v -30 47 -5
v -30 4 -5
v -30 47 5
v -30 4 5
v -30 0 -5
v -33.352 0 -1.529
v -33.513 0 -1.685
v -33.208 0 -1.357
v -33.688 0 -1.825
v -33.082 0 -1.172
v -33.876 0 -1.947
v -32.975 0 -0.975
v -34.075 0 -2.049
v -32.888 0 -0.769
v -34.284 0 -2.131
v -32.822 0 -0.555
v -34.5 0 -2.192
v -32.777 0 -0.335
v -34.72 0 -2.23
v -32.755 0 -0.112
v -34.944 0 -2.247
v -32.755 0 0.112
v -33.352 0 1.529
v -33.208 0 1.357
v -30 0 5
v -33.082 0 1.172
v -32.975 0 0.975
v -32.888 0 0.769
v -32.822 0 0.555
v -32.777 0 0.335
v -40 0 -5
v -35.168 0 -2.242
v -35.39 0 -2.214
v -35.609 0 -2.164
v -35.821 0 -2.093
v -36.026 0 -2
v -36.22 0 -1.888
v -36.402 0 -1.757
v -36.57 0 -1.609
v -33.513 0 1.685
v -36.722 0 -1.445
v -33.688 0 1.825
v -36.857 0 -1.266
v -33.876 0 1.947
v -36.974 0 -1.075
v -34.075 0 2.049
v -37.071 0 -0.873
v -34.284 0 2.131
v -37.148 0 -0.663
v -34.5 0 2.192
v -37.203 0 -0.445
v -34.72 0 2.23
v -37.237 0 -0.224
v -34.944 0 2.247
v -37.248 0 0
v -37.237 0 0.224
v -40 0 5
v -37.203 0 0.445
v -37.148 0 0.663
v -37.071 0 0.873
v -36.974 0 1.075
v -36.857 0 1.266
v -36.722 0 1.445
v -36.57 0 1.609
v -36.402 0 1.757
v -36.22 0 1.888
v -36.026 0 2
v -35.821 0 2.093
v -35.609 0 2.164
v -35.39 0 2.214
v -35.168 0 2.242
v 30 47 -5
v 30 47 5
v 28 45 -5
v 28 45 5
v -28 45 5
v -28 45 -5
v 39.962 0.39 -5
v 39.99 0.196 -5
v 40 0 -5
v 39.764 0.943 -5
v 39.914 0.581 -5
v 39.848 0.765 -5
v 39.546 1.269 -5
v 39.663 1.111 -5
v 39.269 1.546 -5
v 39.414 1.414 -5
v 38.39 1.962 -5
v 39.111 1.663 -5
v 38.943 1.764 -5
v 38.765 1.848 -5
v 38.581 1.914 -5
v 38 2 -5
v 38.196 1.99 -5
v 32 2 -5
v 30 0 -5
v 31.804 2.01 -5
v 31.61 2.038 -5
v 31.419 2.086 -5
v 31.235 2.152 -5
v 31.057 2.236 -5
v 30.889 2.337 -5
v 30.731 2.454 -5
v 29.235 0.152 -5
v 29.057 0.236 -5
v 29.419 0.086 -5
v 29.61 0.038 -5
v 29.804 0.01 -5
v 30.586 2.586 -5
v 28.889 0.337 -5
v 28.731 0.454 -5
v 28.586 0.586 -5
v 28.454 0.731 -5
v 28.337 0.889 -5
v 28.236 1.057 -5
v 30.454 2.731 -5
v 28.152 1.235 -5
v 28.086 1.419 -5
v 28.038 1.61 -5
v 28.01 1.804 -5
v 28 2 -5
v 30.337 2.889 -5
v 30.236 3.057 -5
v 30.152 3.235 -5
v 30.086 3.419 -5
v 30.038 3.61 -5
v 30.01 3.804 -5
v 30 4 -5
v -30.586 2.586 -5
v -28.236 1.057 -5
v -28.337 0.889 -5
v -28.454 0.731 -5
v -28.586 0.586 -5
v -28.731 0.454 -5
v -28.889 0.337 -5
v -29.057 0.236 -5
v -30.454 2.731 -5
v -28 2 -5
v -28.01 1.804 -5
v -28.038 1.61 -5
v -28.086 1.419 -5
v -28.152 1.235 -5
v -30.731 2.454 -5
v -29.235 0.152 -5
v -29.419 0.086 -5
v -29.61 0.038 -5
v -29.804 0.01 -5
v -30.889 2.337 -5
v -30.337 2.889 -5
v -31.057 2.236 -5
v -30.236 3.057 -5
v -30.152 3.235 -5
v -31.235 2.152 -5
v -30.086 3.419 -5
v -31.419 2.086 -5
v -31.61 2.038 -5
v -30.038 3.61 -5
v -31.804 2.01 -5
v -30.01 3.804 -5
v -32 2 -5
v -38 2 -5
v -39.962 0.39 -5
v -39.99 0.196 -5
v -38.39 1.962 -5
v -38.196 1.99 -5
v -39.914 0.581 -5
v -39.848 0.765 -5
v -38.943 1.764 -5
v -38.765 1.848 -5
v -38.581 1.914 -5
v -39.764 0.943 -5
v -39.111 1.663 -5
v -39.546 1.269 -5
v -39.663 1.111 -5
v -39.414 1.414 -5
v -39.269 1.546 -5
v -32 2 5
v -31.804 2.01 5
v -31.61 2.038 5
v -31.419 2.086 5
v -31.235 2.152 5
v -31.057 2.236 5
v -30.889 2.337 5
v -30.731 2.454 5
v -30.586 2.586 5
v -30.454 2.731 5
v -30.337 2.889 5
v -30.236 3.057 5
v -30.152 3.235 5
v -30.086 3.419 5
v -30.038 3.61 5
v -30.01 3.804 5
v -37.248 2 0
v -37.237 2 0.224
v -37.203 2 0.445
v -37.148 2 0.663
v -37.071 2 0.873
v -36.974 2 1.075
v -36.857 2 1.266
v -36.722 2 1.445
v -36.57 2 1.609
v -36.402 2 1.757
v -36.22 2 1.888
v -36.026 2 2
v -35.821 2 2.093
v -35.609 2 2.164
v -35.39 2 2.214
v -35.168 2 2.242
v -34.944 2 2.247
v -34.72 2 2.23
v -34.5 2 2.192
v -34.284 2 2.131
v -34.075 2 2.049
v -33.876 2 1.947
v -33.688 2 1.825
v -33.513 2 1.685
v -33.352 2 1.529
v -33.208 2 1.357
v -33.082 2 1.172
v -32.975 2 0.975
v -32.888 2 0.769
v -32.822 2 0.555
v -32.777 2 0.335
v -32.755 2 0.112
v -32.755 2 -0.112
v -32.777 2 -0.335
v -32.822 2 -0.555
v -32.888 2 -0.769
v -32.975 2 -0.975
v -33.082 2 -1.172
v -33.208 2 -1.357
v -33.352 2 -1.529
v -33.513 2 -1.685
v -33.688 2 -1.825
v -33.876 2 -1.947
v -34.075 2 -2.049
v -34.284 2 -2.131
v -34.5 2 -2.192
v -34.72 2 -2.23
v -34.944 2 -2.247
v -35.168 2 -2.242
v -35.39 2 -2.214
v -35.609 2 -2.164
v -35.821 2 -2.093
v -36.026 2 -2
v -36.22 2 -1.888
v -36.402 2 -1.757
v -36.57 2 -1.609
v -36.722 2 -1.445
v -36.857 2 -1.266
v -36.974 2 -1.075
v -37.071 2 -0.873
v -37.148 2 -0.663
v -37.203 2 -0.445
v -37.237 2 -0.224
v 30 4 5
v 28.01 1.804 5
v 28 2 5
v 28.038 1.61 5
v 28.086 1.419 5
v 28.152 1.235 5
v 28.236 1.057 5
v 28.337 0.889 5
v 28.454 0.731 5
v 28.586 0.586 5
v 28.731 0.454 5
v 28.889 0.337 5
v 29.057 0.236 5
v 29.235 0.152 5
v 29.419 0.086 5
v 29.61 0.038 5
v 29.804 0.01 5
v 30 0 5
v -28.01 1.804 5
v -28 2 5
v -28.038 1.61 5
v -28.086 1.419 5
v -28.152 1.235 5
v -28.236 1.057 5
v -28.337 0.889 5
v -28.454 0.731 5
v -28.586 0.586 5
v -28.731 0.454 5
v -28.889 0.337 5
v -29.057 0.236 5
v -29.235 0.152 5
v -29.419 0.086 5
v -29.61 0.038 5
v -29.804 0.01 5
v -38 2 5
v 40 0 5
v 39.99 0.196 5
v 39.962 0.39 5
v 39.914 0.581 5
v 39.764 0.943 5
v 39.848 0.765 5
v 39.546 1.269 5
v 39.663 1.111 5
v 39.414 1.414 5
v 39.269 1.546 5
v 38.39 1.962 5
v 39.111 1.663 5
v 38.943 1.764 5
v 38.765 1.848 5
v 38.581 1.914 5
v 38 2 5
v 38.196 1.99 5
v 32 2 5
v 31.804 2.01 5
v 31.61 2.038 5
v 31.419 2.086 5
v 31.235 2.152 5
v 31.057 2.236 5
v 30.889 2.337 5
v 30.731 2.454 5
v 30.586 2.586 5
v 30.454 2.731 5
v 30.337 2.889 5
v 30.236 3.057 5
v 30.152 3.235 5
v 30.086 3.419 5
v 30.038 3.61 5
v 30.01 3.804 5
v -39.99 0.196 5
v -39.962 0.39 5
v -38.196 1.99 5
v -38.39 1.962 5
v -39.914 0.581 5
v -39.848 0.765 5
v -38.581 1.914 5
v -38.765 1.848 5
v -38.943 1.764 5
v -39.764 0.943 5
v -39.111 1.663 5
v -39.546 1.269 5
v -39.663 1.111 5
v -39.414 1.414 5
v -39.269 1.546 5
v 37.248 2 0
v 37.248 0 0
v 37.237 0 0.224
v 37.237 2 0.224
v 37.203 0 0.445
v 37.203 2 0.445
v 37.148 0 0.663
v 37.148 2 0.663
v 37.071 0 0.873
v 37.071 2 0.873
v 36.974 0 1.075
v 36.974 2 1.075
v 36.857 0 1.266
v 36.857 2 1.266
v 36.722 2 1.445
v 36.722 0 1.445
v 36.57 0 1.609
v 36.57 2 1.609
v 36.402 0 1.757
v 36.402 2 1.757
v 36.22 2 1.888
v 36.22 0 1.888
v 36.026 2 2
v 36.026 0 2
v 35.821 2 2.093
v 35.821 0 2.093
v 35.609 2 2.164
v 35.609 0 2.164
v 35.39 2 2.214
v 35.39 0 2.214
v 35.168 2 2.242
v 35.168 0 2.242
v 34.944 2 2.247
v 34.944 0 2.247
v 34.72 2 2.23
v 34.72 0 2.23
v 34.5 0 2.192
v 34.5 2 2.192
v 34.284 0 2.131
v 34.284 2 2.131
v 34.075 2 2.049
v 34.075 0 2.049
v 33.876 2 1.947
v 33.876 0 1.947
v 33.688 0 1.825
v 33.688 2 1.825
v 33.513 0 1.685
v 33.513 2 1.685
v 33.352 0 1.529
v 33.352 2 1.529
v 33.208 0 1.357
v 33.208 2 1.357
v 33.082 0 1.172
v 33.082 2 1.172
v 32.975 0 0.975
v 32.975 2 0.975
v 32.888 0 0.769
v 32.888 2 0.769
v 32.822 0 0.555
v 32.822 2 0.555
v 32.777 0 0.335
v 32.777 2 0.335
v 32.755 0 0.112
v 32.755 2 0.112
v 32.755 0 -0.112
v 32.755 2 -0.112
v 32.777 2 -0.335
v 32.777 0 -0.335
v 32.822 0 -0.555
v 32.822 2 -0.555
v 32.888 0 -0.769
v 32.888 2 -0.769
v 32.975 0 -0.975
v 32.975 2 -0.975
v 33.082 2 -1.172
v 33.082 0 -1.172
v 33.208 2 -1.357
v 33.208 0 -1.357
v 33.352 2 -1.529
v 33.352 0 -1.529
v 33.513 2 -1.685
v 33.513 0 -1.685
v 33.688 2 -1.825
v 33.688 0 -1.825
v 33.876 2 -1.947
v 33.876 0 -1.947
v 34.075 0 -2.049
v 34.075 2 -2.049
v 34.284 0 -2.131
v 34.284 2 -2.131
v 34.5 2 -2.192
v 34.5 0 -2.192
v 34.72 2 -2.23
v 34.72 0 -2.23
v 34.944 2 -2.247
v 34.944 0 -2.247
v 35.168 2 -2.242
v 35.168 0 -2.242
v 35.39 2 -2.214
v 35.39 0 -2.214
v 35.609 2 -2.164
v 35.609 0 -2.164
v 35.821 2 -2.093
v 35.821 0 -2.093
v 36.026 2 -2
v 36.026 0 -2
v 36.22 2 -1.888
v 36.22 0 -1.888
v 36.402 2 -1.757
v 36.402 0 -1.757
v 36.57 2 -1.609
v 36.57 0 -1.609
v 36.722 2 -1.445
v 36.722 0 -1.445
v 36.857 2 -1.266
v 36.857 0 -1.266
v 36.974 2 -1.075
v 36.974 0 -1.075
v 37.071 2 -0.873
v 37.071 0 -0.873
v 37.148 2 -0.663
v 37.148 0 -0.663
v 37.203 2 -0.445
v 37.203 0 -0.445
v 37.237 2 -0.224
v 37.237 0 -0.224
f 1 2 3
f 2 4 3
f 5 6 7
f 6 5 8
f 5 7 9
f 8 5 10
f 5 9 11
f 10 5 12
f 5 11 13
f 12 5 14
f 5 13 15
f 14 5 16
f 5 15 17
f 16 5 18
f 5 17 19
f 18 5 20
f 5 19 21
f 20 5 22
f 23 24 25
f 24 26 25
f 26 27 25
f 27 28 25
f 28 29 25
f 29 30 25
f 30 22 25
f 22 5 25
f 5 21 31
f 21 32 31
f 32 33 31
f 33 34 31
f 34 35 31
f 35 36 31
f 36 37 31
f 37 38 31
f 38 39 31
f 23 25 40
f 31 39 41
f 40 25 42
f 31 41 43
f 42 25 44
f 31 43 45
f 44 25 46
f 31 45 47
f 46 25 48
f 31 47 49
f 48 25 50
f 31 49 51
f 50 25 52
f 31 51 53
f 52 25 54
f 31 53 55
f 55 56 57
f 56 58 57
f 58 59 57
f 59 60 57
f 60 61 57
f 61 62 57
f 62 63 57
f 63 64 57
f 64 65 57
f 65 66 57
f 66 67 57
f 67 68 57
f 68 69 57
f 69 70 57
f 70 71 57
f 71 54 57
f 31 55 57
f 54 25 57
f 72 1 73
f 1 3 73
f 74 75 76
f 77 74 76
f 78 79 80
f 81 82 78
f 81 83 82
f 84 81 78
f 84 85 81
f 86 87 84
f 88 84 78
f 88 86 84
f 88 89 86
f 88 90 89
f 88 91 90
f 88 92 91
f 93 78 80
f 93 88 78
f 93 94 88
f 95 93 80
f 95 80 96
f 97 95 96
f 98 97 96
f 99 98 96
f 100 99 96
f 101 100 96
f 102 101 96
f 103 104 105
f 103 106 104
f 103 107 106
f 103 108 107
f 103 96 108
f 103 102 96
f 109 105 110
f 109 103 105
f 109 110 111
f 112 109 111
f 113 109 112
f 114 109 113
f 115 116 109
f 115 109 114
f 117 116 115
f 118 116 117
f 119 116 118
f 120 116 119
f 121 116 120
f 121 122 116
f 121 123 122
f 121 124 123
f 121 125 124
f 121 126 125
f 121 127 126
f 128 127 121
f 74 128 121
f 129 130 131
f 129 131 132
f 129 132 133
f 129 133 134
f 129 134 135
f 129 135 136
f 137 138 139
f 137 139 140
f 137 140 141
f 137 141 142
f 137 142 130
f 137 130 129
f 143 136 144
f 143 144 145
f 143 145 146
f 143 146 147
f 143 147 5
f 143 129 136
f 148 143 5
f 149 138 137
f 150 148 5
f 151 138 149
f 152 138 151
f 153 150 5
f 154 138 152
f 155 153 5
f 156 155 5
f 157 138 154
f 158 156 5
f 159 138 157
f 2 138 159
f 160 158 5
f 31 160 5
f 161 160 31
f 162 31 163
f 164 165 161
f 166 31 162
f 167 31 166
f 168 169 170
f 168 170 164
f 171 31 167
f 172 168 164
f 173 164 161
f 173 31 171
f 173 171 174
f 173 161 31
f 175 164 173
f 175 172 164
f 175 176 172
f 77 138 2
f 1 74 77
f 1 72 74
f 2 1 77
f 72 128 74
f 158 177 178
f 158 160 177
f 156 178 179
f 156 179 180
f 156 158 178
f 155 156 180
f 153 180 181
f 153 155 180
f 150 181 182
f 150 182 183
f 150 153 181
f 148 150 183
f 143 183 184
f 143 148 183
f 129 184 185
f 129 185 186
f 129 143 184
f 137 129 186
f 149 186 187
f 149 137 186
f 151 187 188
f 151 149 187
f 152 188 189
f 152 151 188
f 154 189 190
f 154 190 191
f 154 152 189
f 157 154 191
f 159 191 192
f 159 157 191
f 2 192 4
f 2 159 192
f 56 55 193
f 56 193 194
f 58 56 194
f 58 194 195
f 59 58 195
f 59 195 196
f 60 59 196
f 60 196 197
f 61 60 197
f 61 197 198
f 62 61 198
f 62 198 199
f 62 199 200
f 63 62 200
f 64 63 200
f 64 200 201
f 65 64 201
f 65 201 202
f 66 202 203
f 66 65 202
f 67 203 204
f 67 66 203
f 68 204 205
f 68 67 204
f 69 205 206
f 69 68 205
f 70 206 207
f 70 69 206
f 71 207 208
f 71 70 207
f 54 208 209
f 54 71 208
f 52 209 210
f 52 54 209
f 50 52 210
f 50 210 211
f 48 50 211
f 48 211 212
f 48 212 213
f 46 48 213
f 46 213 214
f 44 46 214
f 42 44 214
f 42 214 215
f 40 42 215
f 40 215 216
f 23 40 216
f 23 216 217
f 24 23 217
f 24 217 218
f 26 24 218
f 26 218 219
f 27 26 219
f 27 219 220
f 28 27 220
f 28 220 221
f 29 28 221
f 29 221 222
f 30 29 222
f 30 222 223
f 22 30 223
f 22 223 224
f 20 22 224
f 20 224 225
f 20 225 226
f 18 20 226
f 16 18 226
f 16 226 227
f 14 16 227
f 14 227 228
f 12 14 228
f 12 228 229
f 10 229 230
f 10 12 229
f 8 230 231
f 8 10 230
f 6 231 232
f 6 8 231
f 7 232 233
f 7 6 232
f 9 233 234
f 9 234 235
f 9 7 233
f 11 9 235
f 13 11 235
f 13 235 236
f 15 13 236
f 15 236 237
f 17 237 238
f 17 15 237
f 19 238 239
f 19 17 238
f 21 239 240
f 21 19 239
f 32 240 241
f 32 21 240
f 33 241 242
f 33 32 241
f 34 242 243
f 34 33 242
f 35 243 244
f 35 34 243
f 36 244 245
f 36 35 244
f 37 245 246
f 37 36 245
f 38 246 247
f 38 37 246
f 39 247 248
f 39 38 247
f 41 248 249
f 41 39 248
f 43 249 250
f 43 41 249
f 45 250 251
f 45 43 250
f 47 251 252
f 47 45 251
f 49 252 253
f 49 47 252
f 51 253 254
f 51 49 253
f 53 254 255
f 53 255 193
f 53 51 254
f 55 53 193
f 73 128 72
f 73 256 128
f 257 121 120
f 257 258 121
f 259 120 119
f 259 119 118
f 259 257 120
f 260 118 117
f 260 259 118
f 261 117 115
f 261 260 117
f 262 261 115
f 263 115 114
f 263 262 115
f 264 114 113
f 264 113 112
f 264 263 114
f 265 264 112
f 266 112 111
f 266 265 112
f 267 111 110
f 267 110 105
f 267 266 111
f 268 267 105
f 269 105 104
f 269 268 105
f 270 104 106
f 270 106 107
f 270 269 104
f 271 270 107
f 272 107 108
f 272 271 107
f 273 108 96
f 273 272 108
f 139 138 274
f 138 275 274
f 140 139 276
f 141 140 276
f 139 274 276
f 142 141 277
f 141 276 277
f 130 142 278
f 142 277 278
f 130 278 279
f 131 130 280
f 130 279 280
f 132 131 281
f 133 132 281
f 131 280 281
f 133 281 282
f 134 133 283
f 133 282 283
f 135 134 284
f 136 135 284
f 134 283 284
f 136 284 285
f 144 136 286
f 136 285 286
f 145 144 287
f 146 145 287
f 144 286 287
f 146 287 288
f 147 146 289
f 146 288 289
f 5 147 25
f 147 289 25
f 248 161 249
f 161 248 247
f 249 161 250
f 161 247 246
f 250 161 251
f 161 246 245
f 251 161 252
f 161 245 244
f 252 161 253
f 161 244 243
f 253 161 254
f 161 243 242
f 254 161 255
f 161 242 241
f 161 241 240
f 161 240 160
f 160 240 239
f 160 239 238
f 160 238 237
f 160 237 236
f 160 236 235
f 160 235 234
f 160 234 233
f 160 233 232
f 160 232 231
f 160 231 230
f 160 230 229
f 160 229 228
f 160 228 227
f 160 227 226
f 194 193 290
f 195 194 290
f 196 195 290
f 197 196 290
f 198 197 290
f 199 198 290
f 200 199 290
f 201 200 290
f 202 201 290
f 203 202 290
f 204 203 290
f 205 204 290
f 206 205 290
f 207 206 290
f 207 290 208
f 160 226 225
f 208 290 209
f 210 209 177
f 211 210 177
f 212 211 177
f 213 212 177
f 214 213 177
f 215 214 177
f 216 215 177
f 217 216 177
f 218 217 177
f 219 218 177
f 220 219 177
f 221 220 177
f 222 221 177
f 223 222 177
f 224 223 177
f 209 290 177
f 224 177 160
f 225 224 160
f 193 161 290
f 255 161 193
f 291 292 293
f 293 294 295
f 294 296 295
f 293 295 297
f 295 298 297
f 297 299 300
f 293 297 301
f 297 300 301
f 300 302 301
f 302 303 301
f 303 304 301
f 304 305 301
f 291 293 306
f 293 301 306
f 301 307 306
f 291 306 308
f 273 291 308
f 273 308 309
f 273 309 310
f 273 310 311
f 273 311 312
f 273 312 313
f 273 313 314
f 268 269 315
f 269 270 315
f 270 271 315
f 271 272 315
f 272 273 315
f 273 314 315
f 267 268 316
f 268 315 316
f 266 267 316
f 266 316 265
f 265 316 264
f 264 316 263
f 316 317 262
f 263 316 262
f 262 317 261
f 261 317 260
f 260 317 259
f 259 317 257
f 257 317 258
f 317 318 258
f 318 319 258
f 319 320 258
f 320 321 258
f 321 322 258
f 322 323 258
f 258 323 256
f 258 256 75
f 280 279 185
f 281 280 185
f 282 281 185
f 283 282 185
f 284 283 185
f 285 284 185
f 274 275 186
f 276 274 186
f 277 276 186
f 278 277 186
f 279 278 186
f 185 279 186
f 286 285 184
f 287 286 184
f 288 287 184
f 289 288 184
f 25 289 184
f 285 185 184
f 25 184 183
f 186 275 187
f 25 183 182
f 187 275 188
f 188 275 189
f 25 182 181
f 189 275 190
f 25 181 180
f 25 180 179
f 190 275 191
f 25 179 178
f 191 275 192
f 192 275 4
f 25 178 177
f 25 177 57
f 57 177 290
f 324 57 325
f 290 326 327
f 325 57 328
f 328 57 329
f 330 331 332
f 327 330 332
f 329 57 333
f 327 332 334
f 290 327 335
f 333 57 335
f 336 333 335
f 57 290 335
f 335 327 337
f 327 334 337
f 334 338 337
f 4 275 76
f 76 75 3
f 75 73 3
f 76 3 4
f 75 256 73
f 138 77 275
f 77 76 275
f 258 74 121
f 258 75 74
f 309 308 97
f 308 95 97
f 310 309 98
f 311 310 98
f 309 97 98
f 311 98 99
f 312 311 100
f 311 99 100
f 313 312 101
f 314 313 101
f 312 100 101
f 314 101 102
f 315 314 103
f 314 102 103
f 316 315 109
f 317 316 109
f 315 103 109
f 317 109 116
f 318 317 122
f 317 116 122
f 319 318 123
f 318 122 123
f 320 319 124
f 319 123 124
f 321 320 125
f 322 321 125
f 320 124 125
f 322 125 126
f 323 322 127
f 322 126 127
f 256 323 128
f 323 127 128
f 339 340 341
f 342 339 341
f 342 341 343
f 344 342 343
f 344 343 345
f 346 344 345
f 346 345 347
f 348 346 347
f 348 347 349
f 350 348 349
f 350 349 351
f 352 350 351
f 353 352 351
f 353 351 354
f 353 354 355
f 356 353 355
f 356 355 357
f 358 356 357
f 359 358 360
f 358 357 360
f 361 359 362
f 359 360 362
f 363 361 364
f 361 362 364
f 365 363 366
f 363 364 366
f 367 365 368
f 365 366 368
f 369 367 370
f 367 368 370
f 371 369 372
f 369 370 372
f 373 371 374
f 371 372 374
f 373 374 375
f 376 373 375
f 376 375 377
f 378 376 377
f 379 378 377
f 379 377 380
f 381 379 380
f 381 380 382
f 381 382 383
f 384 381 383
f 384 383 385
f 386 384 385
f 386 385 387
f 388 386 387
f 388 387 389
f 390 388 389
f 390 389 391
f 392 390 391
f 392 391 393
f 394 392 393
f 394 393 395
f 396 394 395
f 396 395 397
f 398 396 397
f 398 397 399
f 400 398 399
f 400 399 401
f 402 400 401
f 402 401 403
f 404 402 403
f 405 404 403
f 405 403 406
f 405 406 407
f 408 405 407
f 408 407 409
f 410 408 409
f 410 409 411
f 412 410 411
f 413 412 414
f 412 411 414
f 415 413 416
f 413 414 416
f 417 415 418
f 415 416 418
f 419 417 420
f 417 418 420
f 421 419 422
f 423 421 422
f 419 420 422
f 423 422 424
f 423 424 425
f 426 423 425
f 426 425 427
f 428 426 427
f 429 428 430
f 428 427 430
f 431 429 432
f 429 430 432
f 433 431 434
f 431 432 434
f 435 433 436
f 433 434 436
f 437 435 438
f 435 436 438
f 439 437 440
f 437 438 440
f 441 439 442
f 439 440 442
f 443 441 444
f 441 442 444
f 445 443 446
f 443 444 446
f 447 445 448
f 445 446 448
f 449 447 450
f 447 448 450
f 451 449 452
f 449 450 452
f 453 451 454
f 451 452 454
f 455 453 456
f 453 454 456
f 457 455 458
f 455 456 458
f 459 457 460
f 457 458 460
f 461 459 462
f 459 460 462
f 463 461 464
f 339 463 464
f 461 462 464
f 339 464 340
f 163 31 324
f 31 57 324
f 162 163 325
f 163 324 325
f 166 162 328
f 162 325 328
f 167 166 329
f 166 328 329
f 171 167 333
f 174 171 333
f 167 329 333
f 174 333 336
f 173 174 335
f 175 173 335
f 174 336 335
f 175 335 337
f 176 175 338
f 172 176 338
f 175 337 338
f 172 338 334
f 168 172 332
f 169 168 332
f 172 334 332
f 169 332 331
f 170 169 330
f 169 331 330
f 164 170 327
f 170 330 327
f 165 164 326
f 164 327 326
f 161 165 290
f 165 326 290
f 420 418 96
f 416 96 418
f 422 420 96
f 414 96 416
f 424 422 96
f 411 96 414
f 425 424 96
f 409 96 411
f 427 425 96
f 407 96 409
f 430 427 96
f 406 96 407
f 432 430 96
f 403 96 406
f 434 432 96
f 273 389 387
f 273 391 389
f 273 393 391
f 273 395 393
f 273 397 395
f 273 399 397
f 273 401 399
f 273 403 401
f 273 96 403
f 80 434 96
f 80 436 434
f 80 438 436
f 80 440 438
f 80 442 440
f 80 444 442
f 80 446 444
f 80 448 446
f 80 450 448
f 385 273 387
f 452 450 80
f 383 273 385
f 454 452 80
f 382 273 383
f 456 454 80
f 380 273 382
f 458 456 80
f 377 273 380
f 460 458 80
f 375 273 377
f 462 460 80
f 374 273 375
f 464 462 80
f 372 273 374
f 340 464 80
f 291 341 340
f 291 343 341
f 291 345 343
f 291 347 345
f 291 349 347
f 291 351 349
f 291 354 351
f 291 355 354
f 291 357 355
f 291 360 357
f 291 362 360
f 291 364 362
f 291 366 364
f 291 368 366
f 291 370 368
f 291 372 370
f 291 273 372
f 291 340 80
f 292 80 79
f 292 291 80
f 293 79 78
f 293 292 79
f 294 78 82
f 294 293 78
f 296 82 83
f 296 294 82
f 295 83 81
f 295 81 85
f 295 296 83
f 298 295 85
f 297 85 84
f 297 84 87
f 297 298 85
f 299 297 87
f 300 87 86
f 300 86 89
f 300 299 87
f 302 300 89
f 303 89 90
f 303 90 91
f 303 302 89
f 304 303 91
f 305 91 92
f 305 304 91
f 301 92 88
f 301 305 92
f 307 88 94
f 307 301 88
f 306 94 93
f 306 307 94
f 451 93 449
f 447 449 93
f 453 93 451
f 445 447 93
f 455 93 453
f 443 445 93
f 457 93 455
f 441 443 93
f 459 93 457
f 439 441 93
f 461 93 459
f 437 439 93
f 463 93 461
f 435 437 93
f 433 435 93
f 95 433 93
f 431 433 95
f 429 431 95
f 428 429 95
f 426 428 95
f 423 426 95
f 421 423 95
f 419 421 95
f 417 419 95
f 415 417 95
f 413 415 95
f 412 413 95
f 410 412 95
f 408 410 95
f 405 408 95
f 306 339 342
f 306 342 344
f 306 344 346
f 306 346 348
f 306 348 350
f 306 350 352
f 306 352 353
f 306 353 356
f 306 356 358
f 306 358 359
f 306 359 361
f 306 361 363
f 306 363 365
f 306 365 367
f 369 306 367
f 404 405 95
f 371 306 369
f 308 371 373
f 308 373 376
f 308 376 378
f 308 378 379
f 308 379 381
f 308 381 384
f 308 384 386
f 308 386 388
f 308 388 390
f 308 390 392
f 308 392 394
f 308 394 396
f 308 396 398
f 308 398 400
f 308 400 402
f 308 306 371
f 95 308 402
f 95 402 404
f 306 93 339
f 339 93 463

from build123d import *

# Parameters (mm, degrees)
F1_DEPTH = 5
F3_D     = 4.4958
F4_R     = 1.99999


# Not quite as in the source:
# - a fillet or chamfer is up to 0.001 mm smaller than in the source, because OpenCascade refuses the exact size


with BuildPart() as f1:
    # F0 (on Top) → F1 (new body, symmetric)
    with BuildSketch(Plane.XY):
        Polygon((0, 47), (0, 45), (28, 45), (28, 0), (40, 0), (40, 2), (30, 2), (30, 47), align=None)
    extrude(amount=F1_DEPTH, both=True)

    # F3 (through all)
    with Locations(Plane(origin=(0, 2, 0), x_dir=(-1, 0, 0), z_dir=(0, 1, 0))):
        with Locations((-35, 0)):
            Hole(F3_D / 2)

    # F4 (radius 2 in the source; OpenCascade refuses exactly that, so slightly less here)
    f4_edges = [f1.edges().sort_by_distance(p)[0] for p in [
        (30, 2, 0),
        (28, 0, 0),
        (40, 2, 0),
    ]]
    fillet(f4_edges, radius=F4_R)

    # F5: F1 across plane


with BuildPart() as f1_1:
    add(f1.part)
    add(f1.part.mirror(Plane.YZ))


solid = f1_1.part
